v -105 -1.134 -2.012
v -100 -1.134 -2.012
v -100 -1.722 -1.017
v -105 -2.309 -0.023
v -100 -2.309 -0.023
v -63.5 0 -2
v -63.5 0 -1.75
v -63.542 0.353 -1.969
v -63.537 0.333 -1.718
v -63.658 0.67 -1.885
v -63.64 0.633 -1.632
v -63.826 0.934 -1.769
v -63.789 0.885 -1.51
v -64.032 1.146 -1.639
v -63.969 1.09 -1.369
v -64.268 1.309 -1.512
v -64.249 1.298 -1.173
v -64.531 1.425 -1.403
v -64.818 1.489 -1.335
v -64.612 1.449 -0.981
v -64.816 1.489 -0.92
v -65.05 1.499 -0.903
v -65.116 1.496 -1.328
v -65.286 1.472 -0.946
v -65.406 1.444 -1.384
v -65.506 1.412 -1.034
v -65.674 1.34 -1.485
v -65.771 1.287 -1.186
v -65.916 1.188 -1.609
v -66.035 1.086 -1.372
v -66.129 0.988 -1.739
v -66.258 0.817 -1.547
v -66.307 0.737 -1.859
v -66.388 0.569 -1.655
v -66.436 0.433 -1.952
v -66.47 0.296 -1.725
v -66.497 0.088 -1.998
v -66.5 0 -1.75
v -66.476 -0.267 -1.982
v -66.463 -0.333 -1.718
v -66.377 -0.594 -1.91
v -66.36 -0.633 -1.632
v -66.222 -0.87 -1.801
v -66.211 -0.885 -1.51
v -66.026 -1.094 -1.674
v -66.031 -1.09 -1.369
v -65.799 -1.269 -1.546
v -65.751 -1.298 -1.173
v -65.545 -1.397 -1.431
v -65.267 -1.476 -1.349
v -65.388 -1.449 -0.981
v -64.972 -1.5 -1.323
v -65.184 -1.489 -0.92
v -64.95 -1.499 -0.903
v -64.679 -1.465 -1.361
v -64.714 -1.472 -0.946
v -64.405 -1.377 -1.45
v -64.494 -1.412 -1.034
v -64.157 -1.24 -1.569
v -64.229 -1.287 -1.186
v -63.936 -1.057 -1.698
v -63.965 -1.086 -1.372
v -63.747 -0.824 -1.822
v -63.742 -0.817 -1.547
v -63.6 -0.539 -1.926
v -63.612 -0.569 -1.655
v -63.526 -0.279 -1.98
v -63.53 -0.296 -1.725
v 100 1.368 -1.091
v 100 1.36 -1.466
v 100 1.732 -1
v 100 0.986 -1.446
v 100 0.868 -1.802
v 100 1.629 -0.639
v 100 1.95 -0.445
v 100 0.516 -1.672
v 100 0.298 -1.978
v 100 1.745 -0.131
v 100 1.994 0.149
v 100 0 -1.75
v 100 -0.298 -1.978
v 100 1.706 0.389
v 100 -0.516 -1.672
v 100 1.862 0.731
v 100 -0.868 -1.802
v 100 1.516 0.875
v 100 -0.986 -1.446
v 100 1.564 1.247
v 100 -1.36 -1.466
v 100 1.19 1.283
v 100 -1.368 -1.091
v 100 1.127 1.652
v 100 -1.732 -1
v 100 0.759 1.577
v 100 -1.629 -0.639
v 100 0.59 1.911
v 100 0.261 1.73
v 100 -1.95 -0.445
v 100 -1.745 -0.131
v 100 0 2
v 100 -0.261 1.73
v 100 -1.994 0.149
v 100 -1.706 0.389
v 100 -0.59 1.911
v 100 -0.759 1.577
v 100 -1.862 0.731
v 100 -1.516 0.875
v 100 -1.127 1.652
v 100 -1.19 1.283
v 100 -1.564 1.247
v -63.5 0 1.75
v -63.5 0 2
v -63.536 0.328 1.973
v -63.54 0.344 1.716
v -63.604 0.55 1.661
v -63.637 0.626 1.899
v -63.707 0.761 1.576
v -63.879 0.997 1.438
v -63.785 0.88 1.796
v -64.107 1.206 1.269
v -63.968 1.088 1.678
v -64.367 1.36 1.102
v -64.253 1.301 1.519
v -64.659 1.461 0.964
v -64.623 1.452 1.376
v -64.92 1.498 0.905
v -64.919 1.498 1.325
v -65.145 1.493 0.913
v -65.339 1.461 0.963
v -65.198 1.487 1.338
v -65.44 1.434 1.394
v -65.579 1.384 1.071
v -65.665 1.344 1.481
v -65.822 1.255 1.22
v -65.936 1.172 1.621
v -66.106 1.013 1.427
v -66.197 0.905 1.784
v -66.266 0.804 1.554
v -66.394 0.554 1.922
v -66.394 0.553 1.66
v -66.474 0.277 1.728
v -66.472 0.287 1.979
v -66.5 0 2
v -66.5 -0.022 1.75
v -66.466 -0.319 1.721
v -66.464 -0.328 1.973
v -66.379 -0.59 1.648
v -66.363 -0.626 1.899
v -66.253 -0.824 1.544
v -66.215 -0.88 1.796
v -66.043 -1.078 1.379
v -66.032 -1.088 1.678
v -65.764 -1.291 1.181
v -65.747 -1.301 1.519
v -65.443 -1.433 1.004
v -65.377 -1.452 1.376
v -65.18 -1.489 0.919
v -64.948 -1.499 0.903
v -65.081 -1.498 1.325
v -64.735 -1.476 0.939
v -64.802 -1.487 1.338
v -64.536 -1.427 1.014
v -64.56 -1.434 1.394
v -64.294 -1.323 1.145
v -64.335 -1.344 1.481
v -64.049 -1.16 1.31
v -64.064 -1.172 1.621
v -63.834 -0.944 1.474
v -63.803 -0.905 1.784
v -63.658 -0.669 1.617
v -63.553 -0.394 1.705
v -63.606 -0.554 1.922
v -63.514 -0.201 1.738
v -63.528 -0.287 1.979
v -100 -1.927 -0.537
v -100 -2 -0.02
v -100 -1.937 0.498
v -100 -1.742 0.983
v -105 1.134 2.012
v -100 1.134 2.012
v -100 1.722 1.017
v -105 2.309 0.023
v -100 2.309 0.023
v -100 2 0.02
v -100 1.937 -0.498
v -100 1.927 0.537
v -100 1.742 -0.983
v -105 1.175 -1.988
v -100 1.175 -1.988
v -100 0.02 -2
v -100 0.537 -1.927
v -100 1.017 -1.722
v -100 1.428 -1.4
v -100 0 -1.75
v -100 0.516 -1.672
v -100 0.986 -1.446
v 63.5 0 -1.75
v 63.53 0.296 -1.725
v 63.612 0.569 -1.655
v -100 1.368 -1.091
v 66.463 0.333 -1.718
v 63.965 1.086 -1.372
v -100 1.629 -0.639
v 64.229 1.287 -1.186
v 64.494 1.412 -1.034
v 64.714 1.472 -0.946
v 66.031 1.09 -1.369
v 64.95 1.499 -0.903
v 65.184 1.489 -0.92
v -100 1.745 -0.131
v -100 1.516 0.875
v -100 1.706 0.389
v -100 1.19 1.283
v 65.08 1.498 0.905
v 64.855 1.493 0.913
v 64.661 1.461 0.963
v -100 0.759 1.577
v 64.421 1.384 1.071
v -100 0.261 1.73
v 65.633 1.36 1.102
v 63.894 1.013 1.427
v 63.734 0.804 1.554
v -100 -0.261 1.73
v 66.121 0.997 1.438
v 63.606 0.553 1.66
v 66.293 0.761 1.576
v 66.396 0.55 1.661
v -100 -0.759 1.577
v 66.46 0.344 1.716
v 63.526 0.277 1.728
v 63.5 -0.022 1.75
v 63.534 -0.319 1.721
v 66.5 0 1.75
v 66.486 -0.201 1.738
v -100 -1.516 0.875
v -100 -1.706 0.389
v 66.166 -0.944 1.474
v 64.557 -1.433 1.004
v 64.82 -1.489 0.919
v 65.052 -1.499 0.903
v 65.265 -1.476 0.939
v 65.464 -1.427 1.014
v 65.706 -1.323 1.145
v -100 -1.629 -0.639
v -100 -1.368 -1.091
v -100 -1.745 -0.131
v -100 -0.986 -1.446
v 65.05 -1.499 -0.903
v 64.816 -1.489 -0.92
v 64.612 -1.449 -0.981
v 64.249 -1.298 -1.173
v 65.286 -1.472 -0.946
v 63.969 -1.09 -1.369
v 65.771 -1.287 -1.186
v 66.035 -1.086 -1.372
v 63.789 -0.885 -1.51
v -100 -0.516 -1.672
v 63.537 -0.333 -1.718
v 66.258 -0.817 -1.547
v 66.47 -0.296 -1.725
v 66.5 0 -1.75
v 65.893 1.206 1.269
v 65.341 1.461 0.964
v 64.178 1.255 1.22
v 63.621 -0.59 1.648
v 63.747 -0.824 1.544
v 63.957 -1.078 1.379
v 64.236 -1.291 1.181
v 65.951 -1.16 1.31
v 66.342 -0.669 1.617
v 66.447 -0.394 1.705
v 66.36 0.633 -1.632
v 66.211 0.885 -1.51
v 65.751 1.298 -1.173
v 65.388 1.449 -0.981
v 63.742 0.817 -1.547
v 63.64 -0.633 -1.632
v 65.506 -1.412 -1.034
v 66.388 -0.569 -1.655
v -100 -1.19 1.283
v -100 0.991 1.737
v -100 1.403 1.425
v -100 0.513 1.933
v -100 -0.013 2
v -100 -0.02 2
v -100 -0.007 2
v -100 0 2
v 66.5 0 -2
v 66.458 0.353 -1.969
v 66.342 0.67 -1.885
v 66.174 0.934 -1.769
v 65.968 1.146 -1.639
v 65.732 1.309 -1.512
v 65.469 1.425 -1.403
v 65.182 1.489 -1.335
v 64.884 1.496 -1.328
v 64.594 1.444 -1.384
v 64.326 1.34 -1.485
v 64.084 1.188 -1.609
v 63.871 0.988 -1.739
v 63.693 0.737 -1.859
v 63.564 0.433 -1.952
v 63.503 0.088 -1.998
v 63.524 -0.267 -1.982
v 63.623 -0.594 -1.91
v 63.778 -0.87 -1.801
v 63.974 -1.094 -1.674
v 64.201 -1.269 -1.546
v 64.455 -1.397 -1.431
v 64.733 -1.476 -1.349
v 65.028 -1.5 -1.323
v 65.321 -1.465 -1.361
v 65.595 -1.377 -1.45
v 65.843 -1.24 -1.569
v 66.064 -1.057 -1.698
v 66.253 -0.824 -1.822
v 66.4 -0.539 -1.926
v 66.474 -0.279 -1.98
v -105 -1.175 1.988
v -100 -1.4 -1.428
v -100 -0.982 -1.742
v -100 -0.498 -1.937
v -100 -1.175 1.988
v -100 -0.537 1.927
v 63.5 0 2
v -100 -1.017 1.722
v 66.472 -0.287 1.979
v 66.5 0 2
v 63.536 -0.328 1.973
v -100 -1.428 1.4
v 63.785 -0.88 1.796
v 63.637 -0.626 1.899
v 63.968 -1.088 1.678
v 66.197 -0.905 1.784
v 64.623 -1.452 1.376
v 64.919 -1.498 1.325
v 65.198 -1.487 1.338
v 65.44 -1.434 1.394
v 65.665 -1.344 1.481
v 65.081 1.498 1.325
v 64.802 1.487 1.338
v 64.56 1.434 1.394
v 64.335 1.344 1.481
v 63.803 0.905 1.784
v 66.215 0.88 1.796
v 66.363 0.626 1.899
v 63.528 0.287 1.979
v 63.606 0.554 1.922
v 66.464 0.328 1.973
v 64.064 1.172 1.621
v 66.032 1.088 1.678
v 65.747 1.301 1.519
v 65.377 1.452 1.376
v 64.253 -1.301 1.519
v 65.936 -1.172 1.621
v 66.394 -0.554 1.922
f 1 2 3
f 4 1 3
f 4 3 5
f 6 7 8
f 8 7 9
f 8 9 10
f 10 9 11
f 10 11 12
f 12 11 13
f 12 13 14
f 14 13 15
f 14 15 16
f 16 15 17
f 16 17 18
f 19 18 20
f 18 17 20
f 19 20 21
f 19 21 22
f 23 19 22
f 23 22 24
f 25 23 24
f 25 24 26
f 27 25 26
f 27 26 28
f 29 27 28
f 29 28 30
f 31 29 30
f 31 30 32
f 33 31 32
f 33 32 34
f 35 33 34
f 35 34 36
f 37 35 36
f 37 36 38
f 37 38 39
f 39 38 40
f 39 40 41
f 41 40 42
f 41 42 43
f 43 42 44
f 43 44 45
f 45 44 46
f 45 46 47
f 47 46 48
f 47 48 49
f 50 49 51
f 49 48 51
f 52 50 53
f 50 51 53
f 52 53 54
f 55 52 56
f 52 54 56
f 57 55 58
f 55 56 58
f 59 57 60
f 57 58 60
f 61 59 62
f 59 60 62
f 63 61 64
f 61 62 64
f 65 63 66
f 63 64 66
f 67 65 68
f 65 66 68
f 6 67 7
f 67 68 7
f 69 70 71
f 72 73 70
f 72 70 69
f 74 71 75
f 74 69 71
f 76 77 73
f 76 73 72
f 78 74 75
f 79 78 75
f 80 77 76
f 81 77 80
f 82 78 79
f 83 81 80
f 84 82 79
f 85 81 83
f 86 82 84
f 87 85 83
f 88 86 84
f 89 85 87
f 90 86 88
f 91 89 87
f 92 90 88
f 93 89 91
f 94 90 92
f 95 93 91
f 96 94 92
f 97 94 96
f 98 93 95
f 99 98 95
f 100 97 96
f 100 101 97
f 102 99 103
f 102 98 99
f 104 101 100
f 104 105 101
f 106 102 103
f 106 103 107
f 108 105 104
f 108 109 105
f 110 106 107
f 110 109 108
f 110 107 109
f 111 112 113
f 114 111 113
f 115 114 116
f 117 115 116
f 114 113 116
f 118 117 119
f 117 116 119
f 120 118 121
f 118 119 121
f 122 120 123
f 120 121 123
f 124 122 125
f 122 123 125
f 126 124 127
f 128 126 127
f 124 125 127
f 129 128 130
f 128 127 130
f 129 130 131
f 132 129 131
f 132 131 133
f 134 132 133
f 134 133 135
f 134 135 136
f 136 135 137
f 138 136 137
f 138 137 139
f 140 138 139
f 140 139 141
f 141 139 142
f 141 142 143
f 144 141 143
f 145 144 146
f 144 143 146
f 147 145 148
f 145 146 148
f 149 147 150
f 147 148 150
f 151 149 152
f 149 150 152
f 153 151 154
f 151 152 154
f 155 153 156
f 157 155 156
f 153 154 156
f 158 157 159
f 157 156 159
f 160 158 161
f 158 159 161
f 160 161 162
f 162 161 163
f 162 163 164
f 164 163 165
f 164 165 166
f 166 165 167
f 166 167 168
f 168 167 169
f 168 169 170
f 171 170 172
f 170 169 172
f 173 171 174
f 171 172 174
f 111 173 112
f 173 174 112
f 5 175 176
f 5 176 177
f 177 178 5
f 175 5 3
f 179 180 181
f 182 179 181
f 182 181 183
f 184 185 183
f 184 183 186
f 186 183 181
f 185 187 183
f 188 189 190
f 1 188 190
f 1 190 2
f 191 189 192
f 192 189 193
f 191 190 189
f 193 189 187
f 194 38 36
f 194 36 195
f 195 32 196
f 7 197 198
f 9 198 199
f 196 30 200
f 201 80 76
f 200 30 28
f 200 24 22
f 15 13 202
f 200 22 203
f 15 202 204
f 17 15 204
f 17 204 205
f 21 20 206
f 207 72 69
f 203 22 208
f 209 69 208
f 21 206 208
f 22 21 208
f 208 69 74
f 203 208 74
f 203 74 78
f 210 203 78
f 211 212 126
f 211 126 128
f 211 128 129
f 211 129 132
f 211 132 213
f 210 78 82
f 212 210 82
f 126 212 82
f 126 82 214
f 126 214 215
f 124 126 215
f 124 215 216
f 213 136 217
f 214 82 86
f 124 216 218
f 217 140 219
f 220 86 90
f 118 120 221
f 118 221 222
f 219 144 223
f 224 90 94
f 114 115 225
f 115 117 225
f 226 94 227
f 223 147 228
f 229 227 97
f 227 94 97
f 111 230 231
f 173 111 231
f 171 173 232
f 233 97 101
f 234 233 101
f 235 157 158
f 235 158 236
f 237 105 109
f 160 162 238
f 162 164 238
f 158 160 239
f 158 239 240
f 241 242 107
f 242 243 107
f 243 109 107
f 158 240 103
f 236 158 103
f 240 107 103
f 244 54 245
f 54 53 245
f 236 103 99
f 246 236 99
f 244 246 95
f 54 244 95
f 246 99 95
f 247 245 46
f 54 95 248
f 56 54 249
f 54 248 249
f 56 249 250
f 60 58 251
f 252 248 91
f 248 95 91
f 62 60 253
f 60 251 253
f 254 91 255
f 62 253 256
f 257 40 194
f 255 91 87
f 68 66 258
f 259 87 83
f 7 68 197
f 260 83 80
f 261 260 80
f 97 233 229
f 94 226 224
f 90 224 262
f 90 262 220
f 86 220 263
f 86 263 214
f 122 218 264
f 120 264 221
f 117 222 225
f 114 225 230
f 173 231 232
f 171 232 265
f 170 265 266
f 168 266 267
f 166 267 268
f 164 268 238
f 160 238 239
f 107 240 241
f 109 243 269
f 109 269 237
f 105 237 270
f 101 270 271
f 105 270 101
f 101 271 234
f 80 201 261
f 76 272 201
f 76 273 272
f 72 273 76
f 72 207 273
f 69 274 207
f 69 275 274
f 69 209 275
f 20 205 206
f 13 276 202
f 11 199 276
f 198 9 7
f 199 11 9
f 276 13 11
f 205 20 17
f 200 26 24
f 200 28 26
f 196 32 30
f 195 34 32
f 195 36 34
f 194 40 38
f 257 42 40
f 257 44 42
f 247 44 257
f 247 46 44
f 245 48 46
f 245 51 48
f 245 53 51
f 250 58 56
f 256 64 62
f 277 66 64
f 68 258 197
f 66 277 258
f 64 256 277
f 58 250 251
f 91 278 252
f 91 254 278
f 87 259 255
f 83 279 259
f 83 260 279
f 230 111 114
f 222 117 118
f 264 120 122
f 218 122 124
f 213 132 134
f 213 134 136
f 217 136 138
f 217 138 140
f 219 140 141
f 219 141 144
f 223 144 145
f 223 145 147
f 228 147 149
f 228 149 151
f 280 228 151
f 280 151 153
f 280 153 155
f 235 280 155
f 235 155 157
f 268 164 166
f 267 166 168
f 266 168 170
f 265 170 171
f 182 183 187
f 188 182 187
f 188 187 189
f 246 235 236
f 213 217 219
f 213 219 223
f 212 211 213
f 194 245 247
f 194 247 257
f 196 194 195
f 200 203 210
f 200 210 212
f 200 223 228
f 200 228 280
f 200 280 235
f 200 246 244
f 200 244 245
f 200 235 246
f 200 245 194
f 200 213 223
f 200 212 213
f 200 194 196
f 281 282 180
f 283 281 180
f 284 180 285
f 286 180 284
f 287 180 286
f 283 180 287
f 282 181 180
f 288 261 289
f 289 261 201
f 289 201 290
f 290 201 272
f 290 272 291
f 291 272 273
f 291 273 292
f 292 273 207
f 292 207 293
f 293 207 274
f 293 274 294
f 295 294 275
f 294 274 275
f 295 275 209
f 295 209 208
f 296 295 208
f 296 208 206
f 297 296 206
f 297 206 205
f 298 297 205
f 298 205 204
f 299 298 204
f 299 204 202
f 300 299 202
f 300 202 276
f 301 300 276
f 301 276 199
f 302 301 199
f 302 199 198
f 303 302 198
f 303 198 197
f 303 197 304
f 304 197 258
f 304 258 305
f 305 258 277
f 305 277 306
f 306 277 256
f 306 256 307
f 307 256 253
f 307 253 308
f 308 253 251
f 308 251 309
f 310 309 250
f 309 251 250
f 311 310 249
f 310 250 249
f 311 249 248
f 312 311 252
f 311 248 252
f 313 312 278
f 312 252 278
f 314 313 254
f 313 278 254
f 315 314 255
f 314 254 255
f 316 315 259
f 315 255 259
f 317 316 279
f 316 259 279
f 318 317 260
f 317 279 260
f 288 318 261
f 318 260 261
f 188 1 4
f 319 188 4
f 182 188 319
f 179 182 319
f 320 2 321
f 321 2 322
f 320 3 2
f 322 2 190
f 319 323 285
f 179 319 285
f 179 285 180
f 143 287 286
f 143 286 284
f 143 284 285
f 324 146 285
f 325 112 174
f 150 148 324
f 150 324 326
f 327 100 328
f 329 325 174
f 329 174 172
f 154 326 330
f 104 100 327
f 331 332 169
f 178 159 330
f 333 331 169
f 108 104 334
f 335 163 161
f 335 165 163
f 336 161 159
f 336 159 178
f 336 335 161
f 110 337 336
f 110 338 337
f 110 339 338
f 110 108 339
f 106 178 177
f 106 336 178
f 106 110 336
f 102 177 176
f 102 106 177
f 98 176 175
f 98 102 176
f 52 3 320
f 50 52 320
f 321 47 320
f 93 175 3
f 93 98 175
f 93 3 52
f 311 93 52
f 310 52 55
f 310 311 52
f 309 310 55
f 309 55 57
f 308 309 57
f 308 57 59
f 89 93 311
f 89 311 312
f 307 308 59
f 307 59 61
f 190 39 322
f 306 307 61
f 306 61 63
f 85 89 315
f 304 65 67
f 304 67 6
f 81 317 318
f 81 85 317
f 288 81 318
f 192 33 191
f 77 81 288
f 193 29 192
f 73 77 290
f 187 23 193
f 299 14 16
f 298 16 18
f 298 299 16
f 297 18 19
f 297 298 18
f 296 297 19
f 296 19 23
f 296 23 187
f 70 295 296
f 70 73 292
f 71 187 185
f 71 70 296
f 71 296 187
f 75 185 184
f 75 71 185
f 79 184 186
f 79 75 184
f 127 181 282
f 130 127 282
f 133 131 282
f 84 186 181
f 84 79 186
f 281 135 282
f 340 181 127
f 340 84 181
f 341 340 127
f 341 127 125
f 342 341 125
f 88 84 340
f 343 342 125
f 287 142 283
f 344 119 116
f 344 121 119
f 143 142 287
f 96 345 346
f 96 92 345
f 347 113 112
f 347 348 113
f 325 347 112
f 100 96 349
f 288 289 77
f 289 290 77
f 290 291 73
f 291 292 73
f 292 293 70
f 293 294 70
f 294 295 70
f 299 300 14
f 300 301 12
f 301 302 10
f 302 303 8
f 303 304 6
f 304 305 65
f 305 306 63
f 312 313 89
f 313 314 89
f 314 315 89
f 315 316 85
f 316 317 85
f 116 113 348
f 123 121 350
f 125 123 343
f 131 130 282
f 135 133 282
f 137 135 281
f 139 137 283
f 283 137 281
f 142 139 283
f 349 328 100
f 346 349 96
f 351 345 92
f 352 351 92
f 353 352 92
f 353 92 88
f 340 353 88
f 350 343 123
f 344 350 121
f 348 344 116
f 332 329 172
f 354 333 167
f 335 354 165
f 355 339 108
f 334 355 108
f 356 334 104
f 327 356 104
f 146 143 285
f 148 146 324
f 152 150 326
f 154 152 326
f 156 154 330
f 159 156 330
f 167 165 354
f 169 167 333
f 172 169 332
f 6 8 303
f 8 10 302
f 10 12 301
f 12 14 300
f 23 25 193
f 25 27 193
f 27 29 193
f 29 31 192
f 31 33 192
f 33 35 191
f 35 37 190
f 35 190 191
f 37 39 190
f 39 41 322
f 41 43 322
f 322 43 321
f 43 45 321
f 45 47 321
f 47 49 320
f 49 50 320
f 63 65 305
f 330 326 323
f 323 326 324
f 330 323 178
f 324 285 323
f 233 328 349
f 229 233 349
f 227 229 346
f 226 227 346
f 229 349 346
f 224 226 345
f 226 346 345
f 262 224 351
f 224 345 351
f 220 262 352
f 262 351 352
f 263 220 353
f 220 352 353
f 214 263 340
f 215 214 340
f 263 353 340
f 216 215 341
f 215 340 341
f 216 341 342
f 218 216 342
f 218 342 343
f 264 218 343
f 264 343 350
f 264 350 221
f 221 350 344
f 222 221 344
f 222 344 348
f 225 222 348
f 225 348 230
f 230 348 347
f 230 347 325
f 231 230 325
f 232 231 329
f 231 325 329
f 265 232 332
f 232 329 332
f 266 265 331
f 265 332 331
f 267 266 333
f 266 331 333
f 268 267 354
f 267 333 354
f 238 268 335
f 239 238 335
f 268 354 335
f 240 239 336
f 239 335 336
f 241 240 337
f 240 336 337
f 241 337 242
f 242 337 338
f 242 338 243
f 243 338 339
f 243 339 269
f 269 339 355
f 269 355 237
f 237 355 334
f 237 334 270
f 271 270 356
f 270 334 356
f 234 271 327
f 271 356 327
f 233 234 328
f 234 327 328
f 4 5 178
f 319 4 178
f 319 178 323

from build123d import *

# Parameters (mm, degrees)
SWEEP1_PROFILE_R    = 2
BOSS_EXTRUDE1_DEPTH = 5
SKETCH10_R          = 1.75
CUT_EXTRUDE1_DEPTH  = 200
SKETCH35_R          = 1.5
CUT_EXTRUDE3_DEPTH  = 10


with BuildPart() as part:
    # Sweep1: sweep along a path in Sketch2
    with BuildLine(Plane(origin=(0, 0, 0), x_dir=(1, 0, 0), z_dir=(0, 1, 0))) as sweep1_path:
        Line((-100, 0), (100, 0))
    # Sweep1 profile (on start of the path) → Sweep1 (sweep)
    with BuildSketch(Plane(origin=(-100, 0, 0), x_dir=(0, 0, 1), z_dir=(1, 0, 0))):
        Circle(SWEEP1_PROFILE_R)
    sweep(path=sweep1_path.line)

    # Sketch9 → Boss-Extrude1 (add)
    with BuildSketch(Plane.ZY.offset(100)):
        Polygon((1.98826653, -1.174789146), (2.01153051, 1.134494752), (0.023263979, 2.309283898), (-1.98826653, 1.174789146), (-2.01153051, -1.134494752), (-0.023263979, -2.309283898), align=None)
    extrude(amount=BOSS_EXTRUDE1_DEPTH)

    # Sketch10 → Cut-Extrude1 (cut)
    with BuildSketch(Plane(origin=(100, 0, 0), x_dir=(0, 0, -1), z_dir=(1, 0, 0))):
        Circle(SKETCH10_R)
    extrude(amount=-CUT_EXTRUDE1_DEPTH, mode=Mode.SUBTRACT)

    # Sketch35 → Cut-Extrude3 (cut)
    with BuildSketch(Plane.XY.offset(2)):
        with Locations((65, 0)):
            Circle(SKETCH35_R)
        with Locations((-65, 0)):
            Circle(SKETCH35_R)
    extrude(amount=-CUT_EXTRUDE3_DEPTH, mode=Mode.SUBTRACT)


solid = part.part
